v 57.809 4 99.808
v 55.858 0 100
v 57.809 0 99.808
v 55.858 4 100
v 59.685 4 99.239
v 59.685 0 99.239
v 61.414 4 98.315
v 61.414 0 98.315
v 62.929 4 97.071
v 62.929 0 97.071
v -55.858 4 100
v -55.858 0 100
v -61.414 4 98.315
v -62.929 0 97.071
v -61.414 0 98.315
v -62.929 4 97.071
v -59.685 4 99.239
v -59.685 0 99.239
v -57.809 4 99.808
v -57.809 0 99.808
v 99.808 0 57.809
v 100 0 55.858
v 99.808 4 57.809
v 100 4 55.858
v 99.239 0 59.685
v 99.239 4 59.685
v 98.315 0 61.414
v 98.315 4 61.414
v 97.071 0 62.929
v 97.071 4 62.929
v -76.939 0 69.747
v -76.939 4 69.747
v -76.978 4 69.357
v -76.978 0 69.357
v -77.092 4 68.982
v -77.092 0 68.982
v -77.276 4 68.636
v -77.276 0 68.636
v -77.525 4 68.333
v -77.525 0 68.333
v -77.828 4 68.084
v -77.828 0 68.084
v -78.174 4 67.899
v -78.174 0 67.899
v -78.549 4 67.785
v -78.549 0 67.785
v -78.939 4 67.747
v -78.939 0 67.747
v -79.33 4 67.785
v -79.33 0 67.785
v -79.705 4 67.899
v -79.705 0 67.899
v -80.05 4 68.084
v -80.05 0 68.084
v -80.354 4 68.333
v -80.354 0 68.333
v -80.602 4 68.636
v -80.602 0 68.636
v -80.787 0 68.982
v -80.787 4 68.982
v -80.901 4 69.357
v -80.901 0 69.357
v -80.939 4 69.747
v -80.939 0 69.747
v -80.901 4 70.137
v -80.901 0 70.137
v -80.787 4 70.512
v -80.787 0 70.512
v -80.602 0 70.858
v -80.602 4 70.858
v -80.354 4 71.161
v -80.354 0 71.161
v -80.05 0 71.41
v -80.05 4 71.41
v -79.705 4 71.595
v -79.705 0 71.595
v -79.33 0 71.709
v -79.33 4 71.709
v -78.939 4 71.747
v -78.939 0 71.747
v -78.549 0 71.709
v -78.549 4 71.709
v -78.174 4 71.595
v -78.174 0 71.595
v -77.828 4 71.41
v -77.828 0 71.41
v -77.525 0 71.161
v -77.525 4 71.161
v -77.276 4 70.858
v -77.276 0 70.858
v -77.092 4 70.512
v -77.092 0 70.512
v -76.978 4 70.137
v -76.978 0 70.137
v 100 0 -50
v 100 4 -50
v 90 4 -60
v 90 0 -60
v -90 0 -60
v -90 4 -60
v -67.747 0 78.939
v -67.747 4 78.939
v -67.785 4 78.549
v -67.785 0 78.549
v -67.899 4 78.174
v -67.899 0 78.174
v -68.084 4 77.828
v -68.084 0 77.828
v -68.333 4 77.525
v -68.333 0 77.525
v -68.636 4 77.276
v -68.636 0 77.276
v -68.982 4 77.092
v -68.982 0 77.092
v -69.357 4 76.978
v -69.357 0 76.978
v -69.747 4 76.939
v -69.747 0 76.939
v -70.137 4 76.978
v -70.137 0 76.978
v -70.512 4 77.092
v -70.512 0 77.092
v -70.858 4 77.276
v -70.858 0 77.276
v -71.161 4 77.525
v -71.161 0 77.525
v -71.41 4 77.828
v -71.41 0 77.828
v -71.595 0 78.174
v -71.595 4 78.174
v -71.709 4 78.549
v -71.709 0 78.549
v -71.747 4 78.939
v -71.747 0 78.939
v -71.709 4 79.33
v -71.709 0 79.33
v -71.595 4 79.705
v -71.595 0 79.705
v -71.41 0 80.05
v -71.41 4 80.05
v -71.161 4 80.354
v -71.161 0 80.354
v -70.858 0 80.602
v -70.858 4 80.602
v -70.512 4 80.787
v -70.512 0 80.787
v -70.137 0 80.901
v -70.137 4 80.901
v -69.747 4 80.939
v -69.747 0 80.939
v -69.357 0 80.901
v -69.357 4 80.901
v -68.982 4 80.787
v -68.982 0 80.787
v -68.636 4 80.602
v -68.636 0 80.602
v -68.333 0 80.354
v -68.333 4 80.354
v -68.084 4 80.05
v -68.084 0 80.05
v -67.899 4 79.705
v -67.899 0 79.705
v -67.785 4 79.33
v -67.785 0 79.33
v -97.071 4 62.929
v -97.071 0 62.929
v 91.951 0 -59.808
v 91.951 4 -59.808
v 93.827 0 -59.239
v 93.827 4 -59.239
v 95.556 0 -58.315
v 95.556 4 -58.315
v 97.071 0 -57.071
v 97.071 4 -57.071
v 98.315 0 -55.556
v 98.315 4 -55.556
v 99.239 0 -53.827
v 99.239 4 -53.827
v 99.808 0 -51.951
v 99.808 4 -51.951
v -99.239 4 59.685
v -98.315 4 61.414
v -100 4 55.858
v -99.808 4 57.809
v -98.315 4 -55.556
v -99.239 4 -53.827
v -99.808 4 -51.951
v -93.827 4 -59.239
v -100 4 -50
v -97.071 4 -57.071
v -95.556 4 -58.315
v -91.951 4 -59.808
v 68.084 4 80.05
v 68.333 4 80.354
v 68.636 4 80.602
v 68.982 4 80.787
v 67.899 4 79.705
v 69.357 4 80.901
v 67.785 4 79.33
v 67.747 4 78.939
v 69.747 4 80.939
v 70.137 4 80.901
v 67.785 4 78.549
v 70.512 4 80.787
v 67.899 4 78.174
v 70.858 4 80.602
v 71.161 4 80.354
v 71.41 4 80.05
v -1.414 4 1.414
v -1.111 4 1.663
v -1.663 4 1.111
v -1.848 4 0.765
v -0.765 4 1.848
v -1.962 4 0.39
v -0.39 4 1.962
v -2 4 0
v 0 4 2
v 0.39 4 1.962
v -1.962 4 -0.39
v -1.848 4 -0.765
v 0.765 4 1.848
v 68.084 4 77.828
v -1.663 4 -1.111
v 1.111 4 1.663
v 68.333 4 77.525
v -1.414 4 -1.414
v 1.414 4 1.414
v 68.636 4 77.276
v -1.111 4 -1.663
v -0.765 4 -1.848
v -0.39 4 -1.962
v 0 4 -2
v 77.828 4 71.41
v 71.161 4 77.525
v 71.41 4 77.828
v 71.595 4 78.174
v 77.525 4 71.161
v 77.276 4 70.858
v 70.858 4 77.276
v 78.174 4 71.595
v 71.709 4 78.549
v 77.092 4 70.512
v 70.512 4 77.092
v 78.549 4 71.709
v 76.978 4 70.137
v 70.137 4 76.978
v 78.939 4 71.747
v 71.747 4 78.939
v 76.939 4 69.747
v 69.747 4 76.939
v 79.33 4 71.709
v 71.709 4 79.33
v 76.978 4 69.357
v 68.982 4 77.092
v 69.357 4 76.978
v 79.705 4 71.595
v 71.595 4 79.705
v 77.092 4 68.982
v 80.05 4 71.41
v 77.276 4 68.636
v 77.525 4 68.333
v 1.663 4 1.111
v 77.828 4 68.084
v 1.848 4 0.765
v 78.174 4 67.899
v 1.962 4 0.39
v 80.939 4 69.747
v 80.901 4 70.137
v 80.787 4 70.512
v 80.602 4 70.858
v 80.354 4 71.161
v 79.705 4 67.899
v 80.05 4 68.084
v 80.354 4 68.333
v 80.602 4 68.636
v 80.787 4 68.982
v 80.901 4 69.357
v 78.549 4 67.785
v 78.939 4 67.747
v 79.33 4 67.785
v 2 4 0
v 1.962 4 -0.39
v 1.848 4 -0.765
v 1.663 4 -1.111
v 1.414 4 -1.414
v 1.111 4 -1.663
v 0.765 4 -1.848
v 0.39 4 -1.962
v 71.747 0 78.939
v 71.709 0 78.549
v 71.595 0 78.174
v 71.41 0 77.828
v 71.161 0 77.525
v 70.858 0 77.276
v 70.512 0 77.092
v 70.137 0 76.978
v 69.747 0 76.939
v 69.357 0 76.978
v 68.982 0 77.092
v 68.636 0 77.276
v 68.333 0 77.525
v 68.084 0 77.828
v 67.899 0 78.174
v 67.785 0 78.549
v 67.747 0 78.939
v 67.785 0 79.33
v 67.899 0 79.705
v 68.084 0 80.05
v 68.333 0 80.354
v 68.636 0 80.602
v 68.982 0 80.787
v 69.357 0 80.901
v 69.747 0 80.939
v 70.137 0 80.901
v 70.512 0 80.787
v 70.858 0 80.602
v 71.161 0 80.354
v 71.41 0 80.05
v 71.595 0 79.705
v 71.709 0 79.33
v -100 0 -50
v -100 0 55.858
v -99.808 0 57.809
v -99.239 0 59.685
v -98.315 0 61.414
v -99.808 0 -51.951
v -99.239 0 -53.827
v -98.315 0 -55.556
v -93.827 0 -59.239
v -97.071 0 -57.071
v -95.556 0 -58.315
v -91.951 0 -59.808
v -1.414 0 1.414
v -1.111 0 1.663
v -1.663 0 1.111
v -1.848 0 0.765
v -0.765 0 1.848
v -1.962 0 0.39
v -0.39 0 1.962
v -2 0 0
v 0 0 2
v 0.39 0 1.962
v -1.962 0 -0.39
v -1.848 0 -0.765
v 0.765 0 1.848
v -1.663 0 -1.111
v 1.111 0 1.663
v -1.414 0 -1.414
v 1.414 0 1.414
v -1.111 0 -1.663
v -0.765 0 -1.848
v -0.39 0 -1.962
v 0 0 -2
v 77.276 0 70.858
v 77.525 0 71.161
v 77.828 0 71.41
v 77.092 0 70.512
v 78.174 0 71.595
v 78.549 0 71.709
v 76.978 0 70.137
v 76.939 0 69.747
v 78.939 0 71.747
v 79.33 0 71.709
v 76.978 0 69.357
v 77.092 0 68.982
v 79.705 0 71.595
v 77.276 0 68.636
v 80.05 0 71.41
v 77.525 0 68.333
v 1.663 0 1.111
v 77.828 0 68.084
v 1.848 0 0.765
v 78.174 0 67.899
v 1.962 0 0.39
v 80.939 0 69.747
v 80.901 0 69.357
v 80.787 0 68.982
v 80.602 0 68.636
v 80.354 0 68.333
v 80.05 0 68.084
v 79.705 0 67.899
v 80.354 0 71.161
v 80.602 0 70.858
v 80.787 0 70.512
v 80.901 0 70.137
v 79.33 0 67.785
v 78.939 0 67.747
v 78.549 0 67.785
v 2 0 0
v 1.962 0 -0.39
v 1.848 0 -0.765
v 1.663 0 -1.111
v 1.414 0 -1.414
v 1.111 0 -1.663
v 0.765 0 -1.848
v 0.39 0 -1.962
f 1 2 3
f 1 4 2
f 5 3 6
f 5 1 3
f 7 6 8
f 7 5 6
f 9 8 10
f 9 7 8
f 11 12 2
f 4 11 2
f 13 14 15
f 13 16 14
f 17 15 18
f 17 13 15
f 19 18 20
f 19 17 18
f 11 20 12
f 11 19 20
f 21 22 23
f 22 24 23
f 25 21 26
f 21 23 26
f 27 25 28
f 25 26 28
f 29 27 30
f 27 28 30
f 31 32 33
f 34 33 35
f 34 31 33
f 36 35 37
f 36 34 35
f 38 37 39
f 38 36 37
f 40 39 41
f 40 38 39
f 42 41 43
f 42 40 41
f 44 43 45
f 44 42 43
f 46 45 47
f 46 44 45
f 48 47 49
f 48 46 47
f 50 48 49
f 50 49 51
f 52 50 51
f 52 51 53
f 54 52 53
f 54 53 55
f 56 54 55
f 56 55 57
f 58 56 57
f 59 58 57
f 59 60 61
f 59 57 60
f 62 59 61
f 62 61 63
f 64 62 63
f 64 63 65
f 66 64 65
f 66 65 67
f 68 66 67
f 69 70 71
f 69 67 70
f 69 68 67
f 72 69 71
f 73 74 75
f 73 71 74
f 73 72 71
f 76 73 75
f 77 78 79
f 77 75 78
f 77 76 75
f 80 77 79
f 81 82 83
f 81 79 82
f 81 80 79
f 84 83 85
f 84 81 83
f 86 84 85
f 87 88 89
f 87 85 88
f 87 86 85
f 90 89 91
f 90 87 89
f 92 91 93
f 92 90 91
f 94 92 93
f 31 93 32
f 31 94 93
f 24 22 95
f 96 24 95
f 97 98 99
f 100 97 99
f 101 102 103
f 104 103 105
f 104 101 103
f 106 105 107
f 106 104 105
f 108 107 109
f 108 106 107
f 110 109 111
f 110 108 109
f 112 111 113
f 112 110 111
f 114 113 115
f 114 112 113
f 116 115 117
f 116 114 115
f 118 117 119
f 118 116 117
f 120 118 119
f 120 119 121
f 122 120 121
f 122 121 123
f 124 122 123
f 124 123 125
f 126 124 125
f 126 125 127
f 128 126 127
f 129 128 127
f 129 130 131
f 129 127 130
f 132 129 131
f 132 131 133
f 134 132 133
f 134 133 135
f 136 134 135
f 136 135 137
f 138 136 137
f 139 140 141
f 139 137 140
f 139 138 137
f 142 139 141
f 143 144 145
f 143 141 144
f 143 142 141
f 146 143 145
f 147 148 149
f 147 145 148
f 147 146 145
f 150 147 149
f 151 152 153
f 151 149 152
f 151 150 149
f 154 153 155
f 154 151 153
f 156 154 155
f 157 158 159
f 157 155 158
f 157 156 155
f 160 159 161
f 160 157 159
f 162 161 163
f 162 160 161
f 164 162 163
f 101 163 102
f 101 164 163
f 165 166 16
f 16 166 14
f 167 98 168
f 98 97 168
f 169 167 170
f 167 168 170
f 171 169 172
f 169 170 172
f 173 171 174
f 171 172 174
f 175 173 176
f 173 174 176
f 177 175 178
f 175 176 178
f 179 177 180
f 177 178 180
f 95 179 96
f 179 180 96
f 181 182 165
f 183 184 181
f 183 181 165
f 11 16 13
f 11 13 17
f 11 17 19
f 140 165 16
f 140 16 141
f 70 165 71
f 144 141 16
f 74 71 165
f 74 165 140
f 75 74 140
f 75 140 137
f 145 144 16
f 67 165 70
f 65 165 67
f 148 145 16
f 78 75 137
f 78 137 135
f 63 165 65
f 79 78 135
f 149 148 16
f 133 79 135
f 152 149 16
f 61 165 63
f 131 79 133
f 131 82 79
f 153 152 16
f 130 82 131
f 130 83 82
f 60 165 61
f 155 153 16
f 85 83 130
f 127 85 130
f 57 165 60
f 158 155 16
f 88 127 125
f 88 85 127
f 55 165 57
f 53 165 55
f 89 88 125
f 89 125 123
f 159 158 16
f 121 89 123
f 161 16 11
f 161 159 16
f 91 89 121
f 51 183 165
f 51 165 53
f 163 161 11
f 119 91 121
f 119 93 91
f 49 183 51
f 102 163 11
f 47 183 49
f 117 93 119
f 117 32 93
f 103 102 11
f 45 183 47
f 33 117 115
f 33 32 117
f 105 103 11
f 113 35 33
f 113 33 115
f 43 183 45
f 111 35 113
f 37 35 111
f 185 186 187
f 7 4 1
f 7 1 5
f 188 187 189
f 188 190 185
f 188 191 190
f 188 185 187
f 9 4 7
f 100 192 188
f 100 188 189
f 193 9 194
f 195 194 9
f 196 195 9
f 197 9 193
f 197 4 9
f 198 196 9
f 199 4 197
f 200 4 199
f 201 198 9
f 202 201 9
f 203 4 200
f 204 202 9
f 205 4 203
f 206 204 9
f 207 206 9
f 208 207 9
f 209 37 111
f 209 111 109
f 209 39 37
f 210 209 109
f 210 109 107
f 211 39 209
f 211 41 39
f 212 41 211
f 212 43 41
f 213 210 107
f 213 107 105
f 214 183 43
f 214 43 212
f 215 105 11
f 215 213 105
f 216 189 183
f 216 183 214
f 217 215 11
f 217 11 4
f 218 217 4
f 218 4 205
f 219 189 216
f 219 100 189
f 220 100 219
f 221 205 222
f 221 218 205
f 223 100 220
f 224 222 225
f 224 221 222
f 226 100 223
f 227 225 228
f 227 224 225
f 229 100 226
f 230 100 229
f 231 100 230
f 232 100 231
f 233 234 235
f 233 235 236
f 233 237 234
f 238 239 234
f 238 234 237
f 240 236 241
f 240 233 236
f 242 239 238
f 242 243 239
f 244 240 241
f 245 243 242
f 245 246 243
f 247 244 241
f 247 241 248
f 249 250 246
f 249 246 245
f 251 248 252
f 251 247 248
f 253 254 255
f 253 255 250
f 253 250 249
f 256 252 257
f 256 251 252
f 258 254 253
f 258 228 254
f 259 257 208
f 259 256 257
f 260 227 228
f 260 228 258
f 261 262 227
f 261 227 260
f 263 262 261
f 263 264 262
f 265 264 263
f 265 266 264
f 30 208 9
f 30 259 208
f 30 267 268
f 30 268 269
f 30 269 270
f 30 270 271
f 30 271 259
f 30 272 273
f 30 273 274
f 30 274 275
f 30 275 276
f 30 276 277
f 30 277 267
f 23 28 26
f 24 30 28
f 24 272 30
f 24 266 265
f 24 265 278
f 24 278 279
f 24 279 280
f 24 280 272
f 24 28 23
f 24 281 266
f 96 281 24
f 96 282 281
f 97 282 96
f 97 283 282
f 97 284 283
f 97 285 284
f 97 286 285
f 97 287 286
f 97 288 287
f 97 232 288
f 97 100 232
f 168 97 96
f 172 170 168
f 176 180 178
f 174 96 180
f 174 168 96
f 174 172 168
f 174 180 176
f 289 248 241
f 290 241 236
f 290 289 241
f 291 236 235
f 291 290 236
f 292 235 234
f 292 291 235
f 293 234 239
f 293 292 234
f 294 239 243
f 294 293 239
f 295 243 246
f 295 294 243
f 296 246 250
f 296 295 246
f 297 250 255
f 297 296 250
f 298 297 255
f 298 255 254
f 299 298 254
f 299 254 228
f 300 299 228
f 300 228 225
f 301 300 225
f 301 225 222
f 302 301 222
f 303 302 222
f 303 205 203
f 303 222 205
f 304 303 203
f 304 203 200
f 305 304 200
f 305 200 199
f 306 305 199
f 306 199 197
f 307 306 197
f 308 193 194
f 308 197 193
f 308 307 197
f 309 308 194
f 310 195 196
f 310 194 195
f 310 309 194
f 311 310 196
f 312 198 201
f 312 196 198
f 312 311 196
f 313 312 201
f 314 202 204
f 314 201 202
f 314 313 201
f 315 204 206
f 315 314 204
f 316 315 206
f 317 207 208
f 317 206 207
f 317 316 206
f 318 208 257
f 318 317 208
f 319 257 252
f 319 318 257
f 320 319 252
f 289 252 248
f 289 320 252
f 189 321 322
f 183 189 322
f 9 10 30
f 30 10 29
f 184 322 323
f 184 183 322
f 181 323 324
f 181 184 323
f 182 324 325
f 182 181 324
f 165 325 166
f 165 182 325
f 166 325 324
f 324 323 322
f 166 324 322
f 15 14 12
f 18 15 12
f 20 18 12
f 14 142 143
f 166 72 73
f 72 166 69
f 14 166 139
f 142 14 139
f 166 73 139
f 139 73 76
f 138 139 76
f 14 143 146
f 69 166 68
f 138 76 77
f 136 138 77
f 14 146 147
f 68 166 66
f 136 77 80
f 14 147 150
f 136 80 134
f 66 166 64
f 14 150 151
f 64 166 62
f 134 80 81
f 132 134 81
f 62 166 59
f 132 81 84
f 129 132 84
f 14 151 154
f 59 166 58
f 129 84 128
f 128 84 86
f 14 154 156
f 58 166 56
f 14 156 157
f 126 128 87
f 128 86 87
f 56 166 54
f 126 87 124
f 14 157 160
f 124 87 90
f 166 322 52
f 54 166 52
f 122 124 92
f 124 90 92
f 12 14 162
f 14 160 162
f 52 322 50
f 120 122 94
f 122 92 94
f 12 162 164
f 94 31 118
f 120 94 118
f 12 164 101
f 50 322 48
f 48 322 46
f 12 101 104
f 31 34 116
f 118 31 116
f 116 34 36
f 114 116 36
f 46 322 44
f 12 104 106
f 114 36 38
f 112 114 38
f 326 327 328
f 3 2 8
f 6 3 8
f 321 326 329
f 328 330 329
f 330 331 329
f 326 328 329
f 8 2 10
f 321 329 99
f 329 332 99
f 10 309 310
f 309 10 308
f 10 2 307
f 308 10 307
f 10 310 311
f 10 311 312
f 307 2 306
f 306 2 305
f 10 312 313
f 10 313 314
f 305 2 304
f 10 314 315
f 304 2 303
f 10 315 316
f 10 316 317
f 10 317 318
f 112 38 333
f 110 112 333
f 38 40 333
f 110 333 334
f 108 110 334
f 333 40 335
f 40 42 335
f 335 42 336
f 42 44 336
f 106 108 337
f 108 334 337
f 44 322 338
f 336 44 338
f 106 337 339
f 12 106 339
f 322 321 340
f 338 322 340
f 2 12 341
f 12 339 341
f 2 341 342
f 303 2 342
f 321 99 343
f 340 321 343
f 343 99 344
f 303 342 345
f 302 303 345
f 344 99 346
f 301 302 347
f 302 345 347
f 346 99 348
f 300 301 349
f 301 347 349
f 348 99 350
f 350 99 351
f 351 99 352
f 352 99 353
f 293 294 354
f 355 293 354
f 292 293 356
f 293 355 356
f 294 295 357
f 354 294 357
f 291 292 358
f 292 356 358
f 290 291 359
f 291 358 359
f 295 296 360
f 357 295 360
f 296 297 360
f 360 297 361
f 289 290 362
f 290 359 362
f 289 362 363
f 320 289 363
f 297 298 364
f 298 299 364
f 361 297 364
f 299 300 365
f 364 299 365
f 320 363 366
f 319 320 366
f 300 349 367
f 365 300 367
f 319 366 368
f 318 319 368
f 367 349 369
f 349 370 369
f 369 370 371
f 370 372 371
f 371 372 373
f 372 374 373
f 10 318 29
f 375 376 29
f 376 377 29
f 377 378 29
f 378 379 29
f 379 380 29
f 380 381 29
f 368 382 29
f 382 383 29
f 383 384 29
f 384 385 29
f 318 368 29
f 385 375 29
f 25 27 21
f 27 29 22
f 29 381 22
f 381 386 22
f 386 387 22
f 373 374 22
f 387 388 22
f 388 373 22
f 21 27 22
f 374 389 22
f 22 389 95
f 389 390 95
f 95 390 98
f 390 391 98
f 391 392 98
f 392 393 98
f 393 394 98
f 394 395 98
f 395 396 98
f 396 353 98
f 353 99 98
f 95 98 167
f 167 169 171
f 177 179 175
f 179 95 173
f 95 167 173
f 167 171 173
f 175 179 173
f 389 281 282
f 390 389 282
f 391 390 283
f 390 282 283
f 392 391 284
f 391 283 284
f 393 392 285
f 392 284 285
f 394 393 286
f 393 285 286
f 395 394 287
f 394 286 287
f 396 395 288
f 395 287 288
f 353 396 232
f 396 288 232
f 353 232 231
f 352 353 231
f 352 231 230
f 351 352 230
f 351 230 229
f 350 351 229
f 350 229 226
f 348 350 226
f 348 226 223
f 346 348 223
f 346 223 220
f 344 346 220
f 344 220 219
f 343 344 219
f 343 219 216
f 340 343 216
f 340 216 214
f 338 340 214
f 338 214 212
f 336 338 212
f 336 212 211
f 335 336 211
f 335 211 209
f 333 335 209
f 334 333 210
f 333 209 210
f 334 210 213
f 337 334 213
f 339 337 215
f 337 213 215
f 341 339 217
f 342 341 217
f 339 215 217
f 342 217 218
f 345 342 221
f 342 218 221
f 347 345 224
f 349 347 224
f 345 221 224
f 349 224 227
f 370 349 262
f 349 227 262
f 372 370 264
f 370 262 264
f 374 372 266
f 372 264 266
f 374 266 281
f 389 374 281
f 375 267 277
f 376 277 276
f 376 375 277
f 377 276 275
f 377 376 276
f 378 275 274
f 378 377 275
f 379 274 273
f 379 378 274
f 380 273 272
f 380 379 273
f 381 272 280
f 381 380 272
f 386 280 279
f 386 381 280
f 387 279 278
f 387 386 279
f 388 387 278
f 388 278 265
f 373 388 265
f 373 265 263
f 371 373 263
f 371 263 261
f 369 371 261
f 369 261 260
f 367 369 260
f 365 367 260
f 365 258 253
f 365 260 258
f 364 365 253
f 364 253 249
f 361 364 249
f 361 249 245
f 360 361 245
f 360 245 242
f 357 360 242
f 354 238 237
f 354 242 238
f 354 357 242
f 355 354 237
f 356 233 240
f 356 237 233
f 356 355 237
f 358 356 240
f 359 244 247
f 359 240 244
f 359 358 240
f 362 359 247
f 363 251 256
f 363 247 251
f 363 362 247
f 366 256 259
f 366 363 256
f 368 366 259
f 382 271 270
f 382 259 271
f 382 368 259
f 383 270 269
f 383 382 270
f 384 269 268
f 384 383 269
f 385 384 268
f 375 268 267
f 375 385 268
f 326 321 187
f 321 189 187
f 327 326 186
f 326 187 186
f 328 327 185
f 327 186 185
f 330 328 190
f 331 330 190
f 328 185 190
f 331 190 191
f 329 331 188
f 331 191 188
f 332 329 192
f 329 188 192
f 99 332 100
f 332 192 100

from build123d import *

# Parameters (mm, degrees)
EXTRUDE_1_DEPTH     = 4
SKETCH_2_R          = 2
CUT_EXTRUDE_1_DEPTH = 5
FILLET_1_R          = 10
SKETCH_4_R          = 2
CUT_EXTRUDE_2_DEPTH = 5


with BuildPart() as part:
    # 草图1 → 凸台-拉伸1 (new body)
    with BuildSketch(Plane(origin=(0, 0, 0), x_dir=(1, 0, 0), z_dir=(0, 1, 0))):
        Polygon((-100, 60), (-100, -60), (-60, -100), (60, -100), (100, -60), (100, 60), align=None)
    extrude(amount=EXTRUDE_1_DEPTH)

    # 草图2 → 切除-拉伸1 (cut, through all)
    with BuildSketch(Plane(origin=(0, 4, 0), x_dir=(1, 0, 0), z_dir=(0, 1, 0))):
        Circle(SKETCH_2_R)
    extrude(amount=-CUT_EXTRUDE_1_DEPTH, mode=Mode.SUBTRACT)

    # 圆角1
    fillet_1_edges = [part.edges().sort_by_distance(p)[0] for p in [
        (100, 2, -60),
        (100, 2, 60),
        (60, 2, 100),
        (-60, 2, 100),
        (-100, 2, 60),
        (-100, 2, -60),
    ]]
    fillet(fillet_1_edges, radius=FILLET_1_R)

    # 草图4 → 切除-拉伸2 (cut, through all)
    with BuildSketch(Plane(origin=(0, 0, 0), x_dir=(1, 0, 0), z_dir=(0, 1, 0))):
        with Locations((-78.939339828, -69.746951673)):
            Circle(SKETCH_4_R)
        with Locations((-69.746951673, -78.939339828)):
            Circle(SKETCH_4_R)
        with Locations((69.746951673, -78.939339828)):
            Circle(SKETCH_4_R)
        with Locations((78.939339828, -69.746951673)):
            Circle(SKETCH_4_R)
    extrude(amount=CUT_EXTRUDE_2_DEPTH, mode=Mode.SUBTRACT)


solid = part.part
